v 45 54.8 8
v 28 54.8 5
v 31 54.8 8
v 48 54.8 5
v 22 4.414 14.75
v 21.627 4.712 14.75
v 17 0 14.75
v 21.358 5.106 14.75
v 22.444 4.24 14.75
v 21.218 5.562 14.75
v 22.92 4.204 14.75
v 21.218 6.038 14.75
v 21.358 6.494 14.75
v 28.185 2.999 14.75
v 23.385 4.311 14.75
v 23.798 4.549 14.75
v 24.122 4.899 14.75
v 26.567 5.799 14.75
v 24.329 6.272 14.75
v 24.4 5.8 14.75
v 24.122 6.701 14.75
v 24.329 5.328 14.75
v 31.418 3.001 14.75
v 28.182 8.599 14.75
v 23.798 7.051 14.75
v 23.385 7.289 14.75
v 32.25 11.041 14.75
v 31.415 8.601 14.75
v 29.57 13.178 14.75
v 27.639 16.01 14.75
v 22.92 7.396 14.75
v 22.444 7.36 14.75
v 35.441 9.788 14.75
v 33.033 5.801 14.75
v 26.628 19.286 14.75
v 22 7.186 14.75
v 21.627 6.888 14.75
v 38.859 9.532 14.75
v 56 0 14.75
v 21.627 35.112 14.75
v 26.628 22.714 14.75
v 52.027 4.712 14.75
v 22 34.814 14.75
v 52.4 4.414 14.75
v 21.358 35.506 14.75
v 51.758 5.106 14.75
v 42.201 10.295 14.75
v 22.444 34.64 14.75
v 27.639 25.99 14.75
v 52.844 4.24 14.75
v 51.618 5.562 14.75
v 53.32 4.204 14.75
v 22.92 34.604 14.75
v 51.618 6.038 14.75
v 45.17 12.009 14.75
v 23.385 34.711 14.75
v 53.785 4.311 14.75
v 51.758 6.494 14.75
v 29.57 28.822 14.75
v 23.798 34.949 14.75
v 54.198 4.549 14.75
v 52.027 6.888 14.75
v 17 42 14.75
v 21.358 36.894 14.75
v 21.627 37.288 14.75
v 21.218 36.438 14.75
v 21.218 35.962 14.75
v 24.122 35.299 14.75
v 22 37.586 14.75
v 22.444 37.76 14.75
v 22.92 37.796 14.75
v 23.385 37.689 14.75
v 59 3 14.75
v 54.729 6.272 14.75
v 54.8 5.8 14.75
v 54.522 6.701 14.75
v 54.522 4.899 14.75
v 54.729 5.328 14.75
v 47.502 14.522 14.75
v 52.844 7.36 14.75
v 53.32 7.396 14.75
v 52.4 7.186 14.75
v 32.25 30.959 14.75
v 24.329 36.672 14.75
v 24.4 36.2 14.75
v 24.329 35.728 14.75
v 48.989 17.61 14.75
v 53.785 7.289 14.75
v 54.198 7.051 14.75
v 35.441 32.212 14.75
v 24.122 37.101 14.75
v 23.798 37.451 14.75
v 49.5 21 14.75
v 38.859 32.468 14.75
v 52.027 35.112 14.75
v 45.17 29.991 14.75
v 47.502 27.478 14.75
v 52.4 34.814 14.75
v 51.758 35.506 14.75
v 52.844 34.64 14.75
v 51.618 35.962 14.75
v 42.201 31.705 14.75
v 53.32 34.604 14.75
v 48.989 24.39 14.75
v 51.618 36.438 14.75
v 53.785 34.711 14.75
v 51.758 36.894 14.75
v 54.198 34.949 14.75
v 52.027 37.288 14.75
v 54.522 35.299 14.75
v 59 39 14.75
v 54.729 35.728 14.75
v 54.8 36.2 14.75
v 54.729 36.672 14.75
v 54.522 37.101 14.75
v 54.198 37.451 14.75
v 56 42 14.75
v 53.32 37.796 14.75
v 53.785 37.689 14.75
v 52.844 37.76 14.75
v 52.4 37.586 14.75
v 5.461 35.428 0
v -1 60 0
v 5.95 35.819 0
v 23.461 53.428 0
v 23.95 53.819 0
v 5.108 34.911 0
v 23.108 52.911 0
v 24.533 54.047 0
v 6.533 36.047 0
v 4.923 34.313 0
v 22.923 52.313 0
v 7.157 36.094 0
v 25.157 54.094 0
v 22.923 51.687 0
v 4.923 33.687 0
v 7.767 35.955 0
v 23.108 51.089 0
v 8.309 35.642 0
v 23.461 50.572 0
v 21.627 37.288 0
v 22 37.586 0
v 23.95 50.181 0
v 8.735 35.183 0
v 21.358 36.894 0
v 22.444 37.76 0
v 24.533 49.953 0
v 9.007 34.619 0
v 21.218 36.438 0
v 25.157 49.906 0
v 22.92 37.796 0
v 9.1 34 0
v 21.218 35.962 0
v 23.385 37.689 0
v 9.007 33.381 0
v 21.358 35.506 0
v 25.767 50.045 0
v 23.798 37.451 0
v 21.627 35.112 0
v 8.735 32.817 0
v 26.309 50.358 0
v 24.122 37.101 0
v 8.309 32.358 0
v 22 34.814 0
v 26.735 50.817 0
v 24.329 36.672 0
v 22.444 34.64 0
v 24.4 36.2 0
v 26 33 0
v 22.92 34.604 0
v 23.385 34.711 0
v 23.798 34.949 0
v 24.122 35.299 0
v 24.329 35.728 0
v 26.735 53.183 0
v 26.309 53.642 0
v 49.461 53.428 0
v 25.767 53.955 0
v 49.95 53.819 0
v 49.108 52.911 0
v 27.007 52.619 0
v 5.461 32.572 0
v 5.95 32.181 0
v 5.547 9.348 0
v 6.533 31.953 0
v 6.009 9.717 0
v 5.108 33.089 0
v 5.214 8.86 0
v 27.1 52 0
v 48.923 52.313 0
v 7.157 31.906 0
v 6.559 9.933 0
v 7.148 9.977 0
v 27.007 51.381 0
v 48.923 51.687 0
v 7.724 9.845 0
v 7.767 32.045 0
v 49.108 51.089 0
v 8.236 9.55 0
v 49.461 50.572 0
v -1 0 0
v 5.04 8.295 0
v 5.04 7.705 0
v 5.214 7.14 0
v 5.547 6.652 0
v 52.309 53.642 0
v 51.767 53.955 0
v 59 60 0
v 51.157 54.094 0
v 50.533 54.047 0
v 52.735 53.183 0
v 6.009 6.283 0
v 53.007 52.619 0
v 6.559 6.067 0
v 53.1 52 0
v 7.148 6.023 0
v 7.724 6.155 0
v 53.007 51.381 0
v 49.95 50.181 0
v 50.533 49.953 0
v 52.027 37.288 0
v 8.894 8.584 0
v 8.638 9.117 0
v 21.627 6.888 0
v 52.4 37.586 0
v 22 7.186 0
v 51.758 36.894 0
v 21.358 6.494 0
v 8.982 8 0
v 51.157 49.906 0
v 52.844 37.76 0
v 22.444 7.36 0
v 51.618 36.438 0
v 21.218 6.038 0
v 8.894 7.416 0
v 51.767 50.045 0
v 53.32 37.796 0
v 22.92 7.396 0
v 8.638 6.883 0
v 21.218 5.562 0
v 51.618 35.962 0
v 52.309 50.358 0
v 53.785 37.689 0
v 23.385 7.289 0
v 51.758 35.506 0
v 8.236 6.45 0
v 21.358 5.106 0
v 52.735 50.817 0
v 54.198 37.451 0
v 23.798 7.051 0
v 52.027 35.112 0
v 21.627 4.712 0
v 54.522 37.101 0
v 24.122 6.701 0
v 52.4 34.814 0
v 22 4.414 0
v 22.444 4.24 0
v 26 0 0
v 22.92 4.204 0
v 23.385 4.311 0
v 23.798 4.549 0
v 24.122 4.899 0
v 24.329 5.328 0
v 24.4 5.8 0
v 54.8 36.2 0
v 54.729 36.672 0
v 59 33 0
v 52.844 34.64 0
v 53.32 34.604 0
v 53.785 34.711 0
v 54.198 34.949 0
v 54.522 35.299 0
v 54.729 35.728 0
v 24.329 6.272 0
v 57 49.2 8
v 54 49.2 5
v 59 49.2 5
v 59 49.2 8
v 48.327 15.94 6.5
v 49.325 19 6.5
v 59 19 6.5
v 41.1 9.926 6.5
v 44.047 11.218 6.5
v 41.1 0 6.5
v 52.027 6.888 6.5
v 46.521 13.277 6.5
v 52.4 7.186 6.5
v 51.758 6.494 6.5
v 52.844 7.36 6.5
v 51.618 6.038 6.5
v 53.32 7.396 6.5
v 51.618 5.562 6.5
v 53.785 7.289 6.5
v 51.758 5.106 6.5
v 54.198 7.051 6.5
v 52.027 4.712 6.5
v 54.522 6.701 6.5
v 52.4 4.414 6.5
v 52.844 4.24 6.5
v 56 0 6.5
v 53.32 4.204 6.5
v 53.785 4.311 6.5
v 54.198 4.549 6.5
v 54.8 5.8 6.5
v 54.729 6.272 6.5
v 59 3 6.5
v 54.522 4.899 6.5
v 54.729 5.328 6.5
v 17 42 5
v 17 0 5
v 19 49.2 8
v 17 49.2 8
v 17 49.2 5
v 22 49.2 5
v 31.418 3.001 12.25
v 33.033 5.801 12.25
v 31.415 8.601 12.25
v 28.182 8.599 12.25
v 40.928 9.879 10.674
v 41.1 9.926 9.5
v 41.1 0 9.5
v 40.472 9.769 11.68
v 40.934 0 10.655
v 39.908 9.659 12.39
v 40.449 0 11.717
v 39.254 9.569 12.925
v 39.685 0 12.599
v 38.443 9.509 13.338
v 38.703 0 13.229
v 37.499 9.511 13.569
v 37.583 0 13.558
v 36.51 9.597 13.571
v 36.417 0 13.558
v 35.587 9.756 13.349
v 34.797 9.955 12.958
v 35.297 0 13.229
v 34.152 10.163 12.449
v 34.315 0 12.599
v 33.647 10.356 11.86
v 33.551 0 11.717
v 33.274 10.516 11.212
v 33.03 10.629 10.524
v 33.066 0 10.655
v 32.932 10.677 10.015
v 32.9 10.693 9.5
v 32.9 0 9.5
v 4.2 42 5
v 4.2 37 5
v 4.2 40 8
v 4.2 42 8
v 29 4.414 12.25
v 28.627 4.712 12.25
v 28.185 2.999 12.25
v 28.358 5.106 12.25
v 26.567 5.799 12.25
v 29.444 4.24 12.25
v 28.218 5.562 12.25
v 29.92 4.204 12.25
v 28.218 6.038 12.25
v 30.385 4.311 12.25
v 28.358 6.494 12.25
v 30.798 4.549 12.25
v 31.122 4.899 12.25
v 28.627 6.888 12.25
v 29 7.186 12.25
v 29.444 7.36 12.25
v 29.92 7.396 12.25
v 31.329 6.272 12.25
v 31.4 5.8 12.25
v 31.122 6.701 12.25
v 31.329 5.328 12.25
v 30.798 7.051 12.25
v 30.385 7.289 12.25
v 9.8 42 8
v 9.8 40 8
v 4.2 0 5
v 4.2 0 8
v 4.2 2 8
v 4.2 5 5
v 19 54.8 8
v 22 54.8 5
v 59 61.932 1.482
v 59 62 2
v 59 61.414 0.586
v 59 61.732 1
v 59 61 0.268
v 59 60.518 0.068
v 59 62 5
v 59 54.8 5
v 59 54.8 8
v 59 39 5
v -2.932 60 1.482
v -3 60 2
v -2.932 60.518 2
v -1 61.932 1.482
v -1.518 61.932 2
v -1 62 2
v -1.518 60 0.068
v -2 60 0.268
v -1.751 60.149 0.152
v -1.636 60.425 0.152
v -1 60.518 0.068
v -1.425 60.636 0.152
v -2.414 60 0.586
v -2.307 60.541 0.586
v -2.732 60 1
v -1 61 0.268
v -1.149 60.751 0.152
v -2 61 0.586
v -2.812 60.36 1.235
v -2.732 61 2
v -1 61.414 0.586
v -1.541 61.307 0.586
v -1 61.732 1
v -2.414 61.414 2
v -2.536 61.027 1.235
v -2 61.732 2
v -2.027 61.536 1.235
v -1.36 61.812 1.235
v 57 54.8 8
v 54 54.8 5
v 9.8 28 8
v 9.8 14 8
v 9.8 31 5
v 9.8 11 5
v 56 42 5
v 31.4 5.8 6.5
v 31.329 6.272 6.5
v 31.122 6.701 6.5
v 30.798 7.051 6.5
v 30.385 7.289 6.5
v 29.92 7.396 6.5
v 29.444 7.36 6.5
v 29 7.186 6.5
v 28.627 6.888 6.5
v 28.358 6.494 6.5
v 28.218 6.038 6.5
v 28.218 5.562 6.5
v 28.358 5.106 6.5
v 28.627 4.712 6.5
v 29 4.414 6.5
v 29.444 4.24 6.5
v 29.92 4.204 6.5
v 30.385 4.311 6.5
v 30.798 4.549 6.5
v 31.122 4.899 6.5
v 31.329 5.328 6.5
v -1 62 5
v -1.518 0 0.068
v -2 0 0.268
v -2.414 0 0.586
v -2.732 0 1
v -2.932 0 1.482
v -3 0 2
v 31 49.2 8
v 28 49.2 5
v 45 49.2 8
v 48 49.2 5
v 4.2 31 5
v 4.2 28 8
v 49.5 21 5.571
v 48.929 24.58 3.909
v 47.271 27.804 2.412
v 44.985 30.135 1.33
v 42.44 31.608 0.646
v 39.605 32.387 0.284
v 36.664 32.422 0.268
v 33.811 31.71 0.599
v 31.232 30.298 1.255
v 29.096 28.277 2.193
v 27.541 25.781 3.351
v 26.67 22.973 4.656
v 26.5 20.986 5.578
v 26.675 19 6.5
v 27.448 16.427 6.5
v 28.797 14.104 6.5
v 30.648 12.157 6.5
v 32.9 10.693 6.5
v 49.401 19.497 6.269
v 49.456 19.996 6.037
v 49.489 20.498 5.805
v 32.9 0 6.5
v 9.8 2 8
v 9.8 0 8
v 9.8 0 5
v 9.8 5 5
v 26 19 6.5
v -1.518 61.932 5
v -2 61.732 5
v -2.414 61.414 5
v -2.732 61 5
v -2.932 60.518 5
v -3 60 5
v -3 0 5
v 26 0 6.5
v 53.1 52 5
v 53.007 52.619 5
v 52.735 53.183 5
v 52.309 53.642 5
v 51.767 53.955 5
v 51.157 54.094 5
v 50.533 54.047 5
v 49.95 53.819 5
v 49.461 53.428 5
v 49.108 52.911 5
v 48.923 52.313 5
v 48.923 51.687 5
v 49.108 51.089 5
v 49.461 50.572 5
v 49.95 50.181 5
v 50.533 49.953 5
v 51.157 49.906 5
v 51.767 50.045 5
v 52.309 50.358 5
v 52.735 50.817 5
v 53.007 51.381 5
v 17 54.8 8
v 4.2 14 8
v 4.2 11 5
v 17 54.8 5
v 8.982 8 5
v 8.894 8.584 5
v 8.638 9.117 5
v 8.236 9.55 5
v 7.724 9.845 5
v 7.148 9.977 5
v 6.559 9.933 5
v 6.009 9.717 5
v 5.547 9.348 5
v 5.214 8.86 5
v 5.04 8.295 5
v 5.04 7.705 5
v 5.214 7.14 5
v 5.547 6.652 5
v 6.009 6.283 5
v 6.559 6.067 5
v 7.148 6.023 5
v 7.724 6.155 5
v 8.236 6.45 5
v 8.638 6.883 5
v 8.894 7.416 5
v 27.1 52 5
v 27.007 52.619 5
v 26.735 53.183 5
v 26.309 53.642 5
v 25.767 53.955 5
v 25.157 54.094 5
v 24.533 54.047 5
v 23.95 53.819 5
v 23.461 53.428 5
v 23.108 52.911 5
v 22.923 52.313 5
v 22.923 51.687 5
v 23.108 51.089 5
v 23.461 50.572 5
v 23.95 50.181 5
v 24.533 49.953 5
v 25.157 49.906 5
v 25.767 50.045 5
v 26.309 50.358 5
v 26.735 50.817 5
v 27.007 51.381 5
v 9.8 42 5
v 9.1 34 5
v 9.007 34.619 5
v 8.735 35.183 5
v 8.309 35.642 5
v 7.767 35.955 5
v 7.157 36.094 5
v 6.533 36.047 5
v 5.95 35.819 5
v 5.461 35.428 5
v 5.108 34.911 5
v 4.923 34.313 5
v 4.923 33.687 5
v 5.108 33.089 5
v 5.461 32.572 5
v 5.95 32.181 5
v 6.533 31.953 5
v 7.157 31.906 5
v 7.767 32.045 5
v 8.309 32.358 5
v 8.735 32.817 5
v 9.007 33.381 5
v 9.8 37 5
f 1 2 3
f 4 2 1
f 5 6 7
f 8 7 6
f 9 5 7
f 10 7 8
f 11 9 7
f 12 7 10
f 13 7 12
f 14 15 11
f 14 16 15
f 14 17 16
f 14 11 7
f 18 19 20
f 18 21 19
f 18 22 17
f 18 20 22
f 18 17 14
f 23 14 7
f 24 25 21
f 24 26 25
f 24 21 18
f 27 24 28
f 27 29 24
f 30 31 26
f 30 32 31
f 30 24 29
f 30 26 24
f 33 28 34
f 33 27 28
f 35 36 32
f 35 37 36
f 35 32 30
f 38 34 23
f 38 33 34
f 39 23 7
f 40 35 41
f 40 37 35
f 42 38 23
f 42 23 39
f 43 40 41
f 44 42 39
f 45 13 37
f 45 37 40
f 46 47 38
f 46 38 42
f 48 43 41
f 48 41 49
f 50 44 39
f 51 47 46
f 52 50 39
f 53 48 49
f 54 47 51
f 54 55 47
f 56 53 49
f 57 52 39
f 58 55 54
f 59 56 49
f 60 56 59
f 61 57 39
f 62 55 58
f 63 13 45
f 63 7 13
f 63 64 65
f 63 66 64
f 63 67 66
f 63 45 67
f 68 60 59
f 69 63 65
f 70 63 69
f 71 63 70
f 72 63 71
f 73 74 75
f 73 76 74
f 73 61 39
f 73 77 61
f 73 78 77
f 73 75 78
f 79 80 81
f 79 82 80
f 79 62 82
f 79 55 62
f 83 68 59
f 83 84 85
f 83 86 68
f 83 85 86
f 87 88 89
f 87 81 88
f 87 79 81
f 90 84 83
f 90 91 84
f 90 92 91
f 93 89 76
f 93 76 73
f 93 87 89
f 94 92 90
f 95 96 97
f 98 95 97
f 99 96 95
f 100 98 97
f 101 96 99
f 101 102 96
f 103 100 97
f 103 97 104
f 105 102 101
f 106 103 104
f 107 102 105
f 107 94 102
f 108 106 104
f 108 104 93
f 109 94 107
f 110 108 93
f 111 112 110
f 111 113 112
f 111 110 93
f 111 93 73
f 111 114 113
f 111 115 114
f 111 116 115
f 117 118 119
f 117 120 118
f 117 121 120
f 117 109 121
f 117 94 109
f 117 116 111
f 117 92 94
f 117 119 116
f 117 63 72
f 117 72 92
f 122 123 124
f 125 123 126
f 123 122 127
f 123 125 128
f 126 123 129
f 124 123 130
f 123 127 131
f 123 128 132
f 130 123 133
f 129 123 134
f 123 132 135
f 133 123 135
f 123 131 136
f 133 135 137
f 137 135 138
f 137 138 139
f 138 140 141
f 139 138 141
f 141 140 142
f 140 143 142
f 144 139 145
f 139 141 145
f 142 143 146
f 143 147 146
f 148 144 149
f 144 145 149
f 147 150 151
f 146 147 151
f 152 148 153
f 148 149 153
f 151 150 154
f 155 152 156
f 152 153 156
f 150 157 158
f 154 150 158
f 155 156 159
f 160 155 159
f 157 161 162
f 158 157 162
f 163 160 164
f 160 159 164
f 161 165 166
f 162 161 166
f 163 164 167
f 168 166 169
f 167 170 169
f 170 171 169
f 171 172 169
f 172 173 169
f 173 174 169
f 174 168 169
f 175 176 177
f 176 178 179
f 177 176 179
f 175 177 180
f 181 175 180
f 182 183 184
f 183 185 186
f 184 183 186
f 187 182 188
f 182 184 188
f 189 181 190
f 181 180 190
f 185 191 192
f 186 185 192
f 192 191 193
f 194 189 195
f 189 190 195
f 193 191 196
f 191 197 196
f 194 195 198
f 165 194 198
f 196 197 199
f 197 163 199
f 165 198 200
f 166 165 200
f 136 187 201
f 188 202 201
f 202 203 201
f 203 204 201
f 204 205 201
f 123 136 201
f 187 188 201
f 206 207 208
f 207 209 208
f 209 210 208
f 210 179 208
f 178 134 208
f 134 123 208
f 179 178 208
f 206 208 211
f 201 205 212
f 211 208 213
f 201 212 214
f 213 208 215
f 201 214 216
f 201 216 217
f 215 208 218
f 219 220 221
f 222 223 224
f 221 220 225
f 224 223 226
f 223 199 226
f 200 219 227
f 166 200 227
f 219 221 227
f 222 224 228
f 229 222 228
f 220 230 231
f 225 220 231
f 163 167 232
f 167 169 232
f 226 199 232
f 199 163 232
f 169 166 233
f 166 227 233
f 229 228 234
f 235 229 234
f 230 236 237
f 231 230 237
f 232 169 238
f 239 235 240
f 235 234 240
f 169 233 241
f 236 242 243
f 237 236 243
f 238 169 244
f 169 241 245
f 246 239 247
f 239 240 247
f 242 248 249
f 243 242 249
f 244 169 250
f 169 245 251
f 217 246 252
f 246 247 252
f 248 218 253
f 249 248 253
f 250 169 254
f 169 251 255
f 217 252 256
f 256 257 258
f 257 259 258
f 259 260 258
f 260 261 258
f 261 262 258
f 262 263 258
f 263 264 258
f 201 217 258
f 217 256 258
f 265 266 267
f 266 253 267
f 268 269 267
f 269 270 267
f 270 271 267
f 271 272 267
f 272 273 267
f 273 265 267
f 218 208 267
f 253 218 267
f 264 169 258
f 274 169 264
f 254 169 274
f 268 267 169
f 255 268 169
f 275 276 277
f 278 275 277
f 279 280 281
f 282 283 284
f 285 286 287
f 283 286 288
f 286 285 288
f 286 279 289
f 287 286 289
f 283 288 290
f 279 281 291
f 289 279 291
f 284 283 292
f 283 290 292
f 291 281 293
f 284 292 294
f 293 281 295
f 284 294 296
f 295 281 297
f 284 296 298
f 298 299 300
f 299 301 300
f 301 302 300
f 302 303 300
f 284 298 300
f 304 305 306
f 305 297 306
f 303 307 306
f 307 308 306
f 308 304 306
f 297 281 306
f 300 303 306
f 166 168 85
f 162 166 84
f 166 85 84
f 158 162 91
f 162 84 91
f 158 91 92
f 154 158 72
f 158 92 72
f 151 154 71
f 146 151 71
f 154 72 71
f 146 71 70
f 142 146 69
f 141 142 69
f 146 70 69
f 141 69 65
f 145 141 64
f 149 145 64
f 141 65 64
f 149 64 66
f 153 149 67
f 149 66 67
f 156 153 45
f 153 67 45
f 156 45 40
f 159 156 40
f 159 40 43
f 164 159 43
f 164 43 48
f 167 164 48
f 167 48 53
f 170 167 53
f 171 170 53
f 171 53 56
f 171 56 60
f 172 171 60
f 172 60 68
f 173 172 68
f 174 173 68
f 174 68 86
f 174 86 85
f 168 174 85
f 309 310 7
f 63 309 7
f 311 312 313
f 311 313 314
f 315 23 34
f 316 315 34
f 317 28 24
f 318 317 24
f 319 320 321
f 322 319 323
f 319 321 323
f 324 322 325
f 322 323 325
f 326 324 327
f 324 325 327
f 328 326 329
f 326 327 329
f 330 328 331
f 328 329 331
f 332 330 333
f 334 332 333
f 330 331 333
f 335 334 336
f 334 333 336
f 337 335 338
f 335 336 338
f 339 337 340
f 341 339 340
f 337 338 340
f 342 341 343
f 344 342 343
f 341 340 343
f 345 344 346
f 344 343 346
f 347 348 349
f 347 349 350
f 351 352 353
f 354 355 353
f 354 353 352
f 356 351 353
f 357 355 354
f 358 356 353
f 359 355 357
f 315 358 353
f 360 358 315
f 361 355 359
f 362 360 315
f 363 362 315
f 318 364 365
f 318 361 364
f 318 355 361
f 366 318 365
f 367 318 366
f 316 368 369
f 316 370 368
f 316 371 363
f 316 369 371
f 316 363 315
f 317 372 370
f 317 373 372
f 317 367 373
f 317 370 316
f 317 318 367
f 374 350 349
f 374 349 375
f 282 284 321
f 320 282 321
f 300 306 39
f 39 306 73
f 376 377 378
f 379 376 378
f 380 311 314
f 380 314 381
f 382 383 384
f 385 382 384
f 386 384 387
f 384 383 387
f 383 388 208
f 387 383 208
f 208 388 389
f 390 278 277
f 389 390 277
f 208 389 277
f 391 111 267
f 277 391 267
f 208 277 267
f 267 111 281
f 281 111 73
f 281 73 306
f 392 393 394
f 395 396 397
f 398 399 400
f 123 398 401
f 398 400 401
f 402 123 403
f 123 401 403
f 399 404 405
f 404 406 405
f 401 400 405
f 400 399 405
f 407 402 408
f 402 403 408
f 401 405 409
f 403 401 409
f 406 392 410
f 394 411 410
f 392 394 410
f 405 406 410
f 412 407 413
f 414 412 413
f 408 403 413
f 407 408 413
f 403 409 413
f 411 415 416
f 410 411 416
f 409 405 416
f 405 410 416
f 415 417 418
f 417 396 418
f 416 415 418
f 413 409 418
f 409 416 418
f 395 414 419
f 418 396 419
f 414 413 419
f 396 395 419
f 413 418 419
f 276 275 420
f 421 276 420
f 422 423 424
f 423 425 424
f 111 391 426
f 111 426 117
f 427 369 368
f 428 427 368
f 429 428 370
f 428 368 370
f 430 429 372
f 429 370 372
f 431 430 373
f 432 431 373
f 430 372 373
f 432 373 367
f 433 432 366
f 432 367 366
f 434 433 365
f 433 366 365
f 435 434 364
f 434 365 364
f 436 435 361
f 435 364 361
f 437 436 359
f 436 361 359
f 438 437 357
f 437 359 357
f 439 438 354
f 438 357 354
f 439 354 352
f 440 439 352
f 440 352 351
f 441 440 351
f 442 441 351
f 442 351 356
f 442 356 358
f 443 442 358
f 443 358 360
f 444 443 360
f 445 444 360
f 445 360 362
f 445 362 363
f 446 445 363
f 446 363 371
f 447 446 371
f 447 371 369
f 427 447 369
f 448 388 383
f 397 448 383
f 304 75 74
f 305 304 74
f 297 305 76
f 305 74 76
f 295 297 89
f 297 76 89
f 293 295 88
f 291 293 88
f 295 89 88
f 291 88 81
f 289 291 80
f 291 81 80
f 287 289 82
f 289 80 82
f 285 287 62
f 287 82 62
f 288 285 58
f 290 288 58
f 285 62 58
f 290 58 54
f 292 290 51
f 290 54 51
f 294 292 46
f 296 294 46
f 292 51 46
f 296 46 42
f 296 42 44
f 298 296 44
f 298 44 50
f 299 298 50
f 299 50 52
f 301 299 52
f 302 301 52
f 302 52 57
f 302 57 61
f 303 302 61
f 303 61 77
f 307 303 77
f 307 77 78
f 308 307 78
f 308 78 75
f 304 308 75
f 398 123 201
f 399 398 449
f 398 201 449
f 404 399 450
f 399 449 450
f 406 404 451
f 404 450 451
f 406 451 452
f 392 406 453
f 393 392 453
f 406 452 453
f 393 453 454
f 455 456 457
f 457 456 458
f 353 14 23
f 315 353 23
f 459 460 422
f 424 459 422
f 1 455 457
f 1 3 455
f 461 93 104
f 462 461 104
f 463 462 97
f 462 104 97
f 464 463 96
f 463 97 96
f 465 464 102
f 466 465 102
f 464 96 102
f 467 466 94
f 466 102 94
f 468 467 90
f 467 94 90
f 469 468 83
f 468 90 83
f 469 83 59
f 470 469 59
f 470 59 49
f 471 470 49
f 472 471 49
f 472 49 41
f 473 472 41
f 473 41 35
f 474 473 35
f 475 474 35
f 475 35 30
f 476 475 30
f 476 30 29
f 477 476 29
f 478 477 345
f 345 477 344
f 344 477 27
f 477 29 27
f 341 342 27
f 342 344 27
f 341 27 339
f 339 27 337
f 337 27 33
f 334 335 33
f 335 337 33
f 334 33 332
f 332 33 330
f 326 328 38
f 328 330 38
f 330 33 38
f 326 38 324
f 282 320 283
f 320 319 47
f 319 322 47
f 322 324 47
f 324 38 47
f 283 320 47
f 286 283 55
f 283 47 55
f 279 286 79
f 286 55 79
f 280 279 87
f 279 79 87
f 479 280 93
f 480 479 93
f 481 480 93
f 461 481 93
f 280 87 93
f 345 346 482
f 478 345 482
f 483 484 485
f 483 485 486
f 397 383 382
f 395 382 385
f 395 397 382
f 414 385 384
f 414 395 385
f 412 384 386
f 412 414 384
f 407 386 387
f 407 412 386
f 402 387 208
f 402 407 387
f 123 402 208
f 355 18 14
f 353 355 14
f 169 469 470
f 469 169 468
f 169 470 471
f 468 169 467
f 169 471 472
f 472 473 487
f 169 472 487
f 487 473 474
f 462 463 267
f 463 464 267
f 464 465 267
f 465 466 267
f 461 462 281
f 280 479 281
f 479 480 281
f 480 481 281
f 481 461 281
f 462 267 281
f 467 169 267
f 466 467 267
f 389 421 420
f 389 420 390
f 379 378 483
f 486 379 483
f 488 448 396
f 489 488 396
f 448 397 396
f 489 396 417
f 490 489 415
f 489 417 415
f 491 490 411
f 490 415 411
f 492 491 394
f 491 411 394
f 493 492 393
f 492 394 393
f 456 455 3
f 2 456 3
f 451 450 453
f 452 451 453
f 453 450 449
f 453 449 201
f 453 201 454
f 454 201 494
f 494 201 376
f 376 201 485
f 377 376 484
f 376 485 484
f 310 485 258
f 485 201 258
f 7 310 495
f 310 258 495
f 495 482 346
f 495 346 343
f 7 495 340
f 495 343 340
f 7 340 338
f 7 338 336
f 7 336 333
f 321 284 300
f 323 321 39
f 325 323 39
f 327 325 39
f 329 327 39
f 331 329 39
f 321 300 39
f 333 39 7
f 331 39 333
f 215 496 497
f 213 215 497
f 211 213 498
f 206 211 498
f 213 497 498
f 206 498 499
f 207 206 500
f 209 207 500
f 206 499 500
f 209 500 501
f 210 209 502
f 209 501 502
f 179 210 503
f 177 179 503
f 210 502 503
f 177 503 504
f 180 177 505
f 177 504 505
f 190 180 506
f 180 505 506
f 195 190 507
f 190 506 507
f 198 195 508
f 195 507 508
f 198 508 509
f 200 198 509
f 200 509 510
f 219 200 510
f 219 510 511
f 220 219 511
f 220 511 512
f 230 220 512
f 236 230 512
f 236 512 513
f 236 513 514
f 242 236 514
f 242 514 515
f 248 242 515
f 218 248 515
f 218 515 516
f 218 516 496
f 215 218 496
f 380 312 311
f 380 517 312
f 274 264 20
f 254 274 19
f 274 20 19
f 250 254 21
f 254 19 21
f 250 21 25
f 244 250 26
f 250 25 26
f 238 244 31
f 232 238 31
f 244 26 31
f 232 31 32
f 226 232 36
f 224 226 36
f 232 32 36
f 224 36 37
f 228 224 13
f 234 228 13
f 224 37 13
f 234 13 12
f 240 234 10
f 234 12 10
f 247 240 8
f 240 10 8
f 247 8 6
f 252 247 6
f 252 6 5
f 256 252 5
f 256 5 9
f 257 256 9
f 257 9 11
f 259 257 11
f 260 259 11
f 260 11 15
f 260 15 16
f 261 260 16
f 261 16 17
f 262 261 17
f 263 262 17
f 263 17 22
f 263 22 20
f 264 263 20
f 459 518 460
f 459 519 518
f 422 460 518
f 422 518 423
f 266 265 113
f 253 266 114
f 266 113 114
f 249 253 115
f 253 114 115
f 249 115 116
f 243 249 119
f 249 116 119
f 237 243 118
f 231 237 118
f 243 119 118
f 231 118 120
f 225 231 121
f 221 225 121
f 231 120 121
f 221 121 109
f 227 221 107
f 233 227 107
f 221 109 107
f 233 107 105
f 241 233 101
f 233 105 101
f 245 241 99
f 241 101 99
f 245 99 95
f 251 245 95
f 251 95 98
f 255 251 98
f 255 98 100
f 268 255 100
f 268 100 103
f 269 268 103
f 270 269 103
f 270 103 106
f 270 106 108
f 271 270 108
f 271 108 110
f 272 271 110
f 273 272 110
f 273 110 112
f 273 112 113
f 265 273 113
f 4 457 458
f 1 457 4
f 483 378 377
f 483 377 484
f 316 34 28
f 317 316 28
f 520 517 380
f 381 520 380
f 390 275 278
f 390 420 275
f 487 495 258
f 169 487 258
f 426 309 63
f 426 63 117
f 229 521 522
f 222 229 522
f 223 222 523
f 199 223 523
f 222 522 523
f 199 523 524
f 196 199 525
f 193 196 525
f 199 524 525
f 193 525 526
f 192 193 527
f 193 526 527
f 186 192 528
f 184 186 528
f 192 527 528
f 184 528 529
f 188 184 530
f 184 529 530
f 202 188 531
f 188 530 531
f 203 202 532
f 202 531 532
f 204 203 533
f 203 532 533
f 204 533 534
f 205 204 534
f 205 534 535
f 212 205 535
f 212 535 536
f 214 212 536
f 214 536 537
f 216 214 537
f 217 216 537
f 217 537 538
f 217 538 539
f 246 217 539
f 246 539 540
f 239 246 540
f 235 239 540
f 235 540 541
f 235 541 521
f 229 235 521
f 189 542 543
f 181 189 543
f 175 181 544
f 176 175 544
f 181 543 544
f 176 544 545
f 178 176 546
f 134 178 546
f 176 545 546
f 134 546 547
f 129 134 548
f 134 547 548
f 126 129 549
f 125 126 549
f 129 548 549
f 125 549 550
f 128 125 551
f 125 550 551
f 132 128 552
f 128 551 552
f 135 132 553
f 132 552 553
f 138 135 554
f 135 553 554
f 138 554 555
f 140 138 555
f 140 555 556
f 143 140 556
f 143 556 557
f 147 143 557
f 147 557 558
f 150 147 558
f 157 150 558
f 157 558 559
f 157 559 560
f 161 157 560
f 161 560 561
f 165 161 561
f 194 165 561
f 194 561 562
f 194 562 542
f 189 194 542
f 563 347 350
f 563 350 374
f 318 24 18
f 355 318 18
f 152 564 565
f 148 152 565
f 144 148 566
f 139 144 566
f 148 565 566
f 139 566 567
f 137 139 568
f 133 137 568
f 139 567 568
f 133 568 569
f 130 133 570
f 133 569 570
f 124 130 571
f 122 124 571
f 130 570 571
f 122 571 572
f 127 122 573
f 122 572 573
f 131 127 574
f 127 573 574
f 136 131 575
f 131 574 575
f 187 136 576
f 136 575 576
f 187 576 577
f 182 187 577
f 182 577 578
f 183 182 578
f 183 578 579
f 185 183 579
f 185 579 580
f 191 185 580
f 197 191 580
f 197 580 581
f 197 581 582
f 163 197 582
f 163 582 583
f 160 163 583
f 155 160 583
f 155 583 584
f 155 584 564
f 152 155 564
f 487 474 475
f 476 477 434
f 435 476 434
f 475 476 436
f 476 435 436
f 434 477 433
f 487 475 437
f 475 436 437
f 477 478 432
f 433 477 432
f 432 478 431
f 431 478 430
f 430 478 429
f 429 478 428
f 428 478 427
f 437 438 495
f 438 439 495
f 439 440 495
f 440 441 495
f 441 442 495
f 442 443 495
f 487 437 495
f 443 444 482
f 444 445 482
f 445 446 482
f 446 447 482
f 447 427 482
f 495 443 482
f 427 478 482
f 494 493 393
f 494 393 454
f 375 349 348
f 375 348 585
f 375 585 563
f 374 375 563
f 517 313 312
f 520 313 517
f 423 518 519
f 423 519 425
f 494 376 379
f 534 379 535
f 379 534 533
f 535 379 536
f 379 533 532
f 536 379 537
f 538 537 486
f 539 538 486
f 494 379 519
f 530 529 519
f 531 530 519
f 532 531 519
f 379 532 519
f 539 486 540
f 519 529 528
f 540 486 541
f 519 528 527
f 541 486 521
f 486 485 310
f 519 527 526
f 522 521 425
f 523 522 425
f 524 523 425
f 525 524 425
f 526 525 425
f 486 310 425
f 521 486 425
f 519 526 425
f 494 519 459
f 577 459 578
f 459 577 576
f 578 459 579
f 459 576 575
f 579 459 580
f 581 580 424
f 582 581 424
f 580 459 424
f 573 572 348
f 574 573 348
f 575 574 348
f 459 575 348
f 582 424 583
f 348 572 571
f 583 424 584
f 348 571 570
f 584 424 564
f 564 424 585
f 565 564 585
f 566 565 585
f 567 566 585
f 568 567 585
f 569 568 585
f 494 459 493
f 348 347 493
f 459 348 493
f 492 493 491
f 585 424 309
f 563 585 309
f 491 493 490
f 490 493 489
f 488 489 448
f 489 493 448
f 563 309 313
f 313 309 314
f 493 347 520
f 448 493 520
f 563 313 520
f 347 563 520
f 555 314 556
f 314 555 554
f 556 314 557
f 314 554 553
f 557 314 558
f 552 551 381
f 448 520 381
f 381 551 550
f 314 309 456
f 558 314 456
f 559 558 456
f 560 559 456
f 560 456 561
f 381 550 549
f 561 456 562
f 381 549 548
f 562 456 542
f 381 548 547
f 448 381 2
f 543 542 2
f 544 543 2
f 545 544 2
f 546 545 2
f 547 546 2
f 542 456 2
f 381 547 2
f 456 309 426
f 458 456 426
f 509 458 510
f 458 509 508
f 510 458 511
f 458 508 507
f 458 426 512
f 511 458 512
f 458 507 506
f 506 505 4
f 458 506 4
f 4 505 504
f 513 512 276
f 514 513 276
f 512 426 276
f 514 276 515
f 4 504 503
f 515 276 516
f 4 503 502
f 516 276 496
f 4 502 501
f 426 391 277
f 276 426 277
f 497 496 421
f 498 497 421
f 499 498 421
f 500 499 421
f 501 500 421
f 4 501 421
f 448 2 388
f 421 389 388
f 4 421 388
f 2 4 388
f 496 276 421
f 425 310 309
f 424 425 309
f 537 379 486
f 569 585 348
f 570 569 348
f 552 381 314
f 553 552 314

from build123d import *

# Parameters (mm, degrees)
F0_W      = 59
F0_H      = 54
F1_DEPTH  = 5
F2_W      = 42
F2_H      = 42
F3_DEPTH  = 9.75
F5_DEPTH  = 33
F6_R      = 1.6
F6_R_2    = 11.5
F7_DEPTH  = 14.751
F8_SIZE   = 3
F9_R      = 1.6
F10_DEPTH = 2.5
F12_DEPTH = 10.6937211186
F14_DEPTH = 5.001
F16_DEPTH = 20
F18_DEPTH = 20
F19_R     = 2
F20_W     = 5.6
F20_H     = 20
F20_H_2   = 5
F20_W_2   = 5
F20_H_3   = 5.6
F20_W_3   = 20
F21_DEPTH = 3
F22_SIZE  = 2.99999
F23_R     = 1.9824364908
F23_R_2   = 2.1
F24_DEPTH = 5.001


# Not quite as in the source:
# - a fillet or chamfer is up to 0.001 mm smaller than in the source, because OpenCascade refuses the exact size


with BuildPart() as f1:
    # F0 (on Top) → F1 (new body)
    with BuildSketch(Plane.XY):
        with Locations((29.5, 27)):
            Rectangle(F0_W, F0_H)
    extrude(amount=F1_DEPTH)

    # F2 (on face) → F3 (join)
    with BuildSketch(Plane.XY.offset(5)):
        with Locations((38, 21)):
            Rectangle(F2_W, F2_H)
    extrude(amount=F3_DEPTH)

    # F4 (on face) → F5 (cut)
    with BuildSketch(Plane.YZ.offset(59)):
        Polygon((0, 6.5), (0, 0), (33, 0), (19, 6.5), align=None)
    extrude(amount=-F5_DEPTH, mode=Mode.SUBTRACT)

    # F6 (on face) → F7 (cut, through all)
    with BuildSketch(Plane.XY.offset(14.75)):
        with Locations((22.8, 36.2)):
            Circle(F6_R)
        with Locations((38, 21)):
            Circle(F6_R_2)
        with Locations((53.2, 36.2)):
            Circle(F6_R)
        with Locations((22.8, 5.8)):
            Circle(F6_R)
        with Locations((53.2, 5.8)):
            Circle(F6_R)
        with Locations((29.8, 5.8)):
            Circle(F6_R)
    extrude(amount=-F7_DEPTH, mode=Mode.SUBTRACT)

    # F8
    f8_edges = [f1.edges().sort_by_distance(p)[0] for p in [
        (59, 42, 9.875),
        (59, 0, 10.625),
    ]]
    chamfer(f8_edges, length=F8_SIZE)

    # F9 (on face) → F10 (cut)
    with BuildSketch(Plane.XY.offset(14.75)):
        Polygon((31.417729554, 3.0006632601), (33.0331615075, 5.8013265202), (31.4154319535, 8.6006632601), (28.182270446, 8.5993367399), (26.5668384925, 5.7986734798), (28.1845680465, 2.9993367399), align=None)
        with Locations((29.8, 5.8)):
            Circle(F9_R, mode=Mode.SUBTRACT)
    extrude(amount=-F10_DEPTH, mode=Mode.SUBTRACT)

    # F11 (on face) → F12 (cut, through all)
    with BuildSketch(Plane.XZ):
        with BuildLine():
            Line((32.9, 9.5), (32.9, 6.5))
            Line((32.9, 6.5), (41.1, 6.5))
            Line((41.1, 6.5), (41.1, 9.5))
            ThreePointArc((41.1, 9.5), (37, 13.6), (32.9, 9.5))
        make_face()
    extrude(amount=-F12_DEPTH, mode=Mode.SUBTRACT)

    # F13 (on face) → F14 (cut, through all)
    with BuildSketch(Plane.XY.offset(5)):
        Polygon((17, 42), (56, 42), (59, 42), (59, 54), (0, 54), (0, 0), (17, 0), align=None)
    extrude(amount=-F14_DEPTH, mode=Mode.SUBTRACT)

    # F15 (on face) → F16 (join)
    with BuildSketch(Plane(origin=(0, 42, 0), x_dir=(-1, 0, 0), z_dir=(0, 1, 0))):
        Polygon((-56, 5), (-59, 5), (-59, 0), (-17, 0), (-17, 5), align=None)
    extrude(amount=F16_DEPTH)

    # F17 (on face) → F18 (join)
    with BuildSketch(Plane(origin=(17, 0, 0), x_dir=(0, -1, 0), z_dir=(-1, 0, 0))):
        Polygon((-42, 5), (-62, 5), (-62, 0), (0, 0), (0, 5), align=None)
    extrude(amount=F18_DEPTH)

    # F19
    f19_edges = [f1.edges().sort_by_distance(p)[0] for p in [
        (-3, 62, 2.5),
        (-3, 31, 0),
        (28, 62, 0),
    ]]
    fillet(f19_edges, radius=F19_R)

    # F20 (on face) → F21 (join)
    with BuildSketch(Plane.XY.offset(5)):
        with Locations((7, 21)):
            Rectangle(F20_W, F20_H)
        with Locations((7, 39.5)):
            Rectangle(F20_W, F20_H_2)
        with Locations((7, 2.5)):
            Rectangle(F20_W, F20_H_2)
        with Locations((19.5, 52)):
            Rectangle(F20_W_2, F20_H_3)
        with Locations((38, 52)):
            Rectangle(F20_W_3, F20_H_3)
        with Locations((56.5, 52)):
            Rectangle(F20_W_2, F20_H_3)
    extrude(amount=F21_DEPTH)

    # F22 (size 3 in the source; OpenCascade refuses exactly that, so slightly less here)
    f22_edges = [f1.edges().sort_by_distance(p)[0] for p in [
        (54, 52, 8),
        (48, 52, 8),
        (28, 52, 8),
        (22, 52, 8),
        (7, 37, 8),
        (7, 31, 8),
        (7, 11, 8),
        (7, 5, 8),
    ]]
    chamfer(f22_edges, length=F22_SIZE)

    # F23 (on face) → F24 (cut, through all)
    with BuildSketch(Plane.XY.offset(5)):
        with Locations((7, 8)):
            Circle(F23_R)
        with Locations((7, 34)):
            Circle(F23_R_2)
        with Locations((25, 52)):
            Circle(F23_R_2)
        with Locations((51, 52)):
            Circle(F23_R_2)
    extrude(amount=-F24_DEPTH, mode=Mode.SUBTRACT)


solid = f1.part
